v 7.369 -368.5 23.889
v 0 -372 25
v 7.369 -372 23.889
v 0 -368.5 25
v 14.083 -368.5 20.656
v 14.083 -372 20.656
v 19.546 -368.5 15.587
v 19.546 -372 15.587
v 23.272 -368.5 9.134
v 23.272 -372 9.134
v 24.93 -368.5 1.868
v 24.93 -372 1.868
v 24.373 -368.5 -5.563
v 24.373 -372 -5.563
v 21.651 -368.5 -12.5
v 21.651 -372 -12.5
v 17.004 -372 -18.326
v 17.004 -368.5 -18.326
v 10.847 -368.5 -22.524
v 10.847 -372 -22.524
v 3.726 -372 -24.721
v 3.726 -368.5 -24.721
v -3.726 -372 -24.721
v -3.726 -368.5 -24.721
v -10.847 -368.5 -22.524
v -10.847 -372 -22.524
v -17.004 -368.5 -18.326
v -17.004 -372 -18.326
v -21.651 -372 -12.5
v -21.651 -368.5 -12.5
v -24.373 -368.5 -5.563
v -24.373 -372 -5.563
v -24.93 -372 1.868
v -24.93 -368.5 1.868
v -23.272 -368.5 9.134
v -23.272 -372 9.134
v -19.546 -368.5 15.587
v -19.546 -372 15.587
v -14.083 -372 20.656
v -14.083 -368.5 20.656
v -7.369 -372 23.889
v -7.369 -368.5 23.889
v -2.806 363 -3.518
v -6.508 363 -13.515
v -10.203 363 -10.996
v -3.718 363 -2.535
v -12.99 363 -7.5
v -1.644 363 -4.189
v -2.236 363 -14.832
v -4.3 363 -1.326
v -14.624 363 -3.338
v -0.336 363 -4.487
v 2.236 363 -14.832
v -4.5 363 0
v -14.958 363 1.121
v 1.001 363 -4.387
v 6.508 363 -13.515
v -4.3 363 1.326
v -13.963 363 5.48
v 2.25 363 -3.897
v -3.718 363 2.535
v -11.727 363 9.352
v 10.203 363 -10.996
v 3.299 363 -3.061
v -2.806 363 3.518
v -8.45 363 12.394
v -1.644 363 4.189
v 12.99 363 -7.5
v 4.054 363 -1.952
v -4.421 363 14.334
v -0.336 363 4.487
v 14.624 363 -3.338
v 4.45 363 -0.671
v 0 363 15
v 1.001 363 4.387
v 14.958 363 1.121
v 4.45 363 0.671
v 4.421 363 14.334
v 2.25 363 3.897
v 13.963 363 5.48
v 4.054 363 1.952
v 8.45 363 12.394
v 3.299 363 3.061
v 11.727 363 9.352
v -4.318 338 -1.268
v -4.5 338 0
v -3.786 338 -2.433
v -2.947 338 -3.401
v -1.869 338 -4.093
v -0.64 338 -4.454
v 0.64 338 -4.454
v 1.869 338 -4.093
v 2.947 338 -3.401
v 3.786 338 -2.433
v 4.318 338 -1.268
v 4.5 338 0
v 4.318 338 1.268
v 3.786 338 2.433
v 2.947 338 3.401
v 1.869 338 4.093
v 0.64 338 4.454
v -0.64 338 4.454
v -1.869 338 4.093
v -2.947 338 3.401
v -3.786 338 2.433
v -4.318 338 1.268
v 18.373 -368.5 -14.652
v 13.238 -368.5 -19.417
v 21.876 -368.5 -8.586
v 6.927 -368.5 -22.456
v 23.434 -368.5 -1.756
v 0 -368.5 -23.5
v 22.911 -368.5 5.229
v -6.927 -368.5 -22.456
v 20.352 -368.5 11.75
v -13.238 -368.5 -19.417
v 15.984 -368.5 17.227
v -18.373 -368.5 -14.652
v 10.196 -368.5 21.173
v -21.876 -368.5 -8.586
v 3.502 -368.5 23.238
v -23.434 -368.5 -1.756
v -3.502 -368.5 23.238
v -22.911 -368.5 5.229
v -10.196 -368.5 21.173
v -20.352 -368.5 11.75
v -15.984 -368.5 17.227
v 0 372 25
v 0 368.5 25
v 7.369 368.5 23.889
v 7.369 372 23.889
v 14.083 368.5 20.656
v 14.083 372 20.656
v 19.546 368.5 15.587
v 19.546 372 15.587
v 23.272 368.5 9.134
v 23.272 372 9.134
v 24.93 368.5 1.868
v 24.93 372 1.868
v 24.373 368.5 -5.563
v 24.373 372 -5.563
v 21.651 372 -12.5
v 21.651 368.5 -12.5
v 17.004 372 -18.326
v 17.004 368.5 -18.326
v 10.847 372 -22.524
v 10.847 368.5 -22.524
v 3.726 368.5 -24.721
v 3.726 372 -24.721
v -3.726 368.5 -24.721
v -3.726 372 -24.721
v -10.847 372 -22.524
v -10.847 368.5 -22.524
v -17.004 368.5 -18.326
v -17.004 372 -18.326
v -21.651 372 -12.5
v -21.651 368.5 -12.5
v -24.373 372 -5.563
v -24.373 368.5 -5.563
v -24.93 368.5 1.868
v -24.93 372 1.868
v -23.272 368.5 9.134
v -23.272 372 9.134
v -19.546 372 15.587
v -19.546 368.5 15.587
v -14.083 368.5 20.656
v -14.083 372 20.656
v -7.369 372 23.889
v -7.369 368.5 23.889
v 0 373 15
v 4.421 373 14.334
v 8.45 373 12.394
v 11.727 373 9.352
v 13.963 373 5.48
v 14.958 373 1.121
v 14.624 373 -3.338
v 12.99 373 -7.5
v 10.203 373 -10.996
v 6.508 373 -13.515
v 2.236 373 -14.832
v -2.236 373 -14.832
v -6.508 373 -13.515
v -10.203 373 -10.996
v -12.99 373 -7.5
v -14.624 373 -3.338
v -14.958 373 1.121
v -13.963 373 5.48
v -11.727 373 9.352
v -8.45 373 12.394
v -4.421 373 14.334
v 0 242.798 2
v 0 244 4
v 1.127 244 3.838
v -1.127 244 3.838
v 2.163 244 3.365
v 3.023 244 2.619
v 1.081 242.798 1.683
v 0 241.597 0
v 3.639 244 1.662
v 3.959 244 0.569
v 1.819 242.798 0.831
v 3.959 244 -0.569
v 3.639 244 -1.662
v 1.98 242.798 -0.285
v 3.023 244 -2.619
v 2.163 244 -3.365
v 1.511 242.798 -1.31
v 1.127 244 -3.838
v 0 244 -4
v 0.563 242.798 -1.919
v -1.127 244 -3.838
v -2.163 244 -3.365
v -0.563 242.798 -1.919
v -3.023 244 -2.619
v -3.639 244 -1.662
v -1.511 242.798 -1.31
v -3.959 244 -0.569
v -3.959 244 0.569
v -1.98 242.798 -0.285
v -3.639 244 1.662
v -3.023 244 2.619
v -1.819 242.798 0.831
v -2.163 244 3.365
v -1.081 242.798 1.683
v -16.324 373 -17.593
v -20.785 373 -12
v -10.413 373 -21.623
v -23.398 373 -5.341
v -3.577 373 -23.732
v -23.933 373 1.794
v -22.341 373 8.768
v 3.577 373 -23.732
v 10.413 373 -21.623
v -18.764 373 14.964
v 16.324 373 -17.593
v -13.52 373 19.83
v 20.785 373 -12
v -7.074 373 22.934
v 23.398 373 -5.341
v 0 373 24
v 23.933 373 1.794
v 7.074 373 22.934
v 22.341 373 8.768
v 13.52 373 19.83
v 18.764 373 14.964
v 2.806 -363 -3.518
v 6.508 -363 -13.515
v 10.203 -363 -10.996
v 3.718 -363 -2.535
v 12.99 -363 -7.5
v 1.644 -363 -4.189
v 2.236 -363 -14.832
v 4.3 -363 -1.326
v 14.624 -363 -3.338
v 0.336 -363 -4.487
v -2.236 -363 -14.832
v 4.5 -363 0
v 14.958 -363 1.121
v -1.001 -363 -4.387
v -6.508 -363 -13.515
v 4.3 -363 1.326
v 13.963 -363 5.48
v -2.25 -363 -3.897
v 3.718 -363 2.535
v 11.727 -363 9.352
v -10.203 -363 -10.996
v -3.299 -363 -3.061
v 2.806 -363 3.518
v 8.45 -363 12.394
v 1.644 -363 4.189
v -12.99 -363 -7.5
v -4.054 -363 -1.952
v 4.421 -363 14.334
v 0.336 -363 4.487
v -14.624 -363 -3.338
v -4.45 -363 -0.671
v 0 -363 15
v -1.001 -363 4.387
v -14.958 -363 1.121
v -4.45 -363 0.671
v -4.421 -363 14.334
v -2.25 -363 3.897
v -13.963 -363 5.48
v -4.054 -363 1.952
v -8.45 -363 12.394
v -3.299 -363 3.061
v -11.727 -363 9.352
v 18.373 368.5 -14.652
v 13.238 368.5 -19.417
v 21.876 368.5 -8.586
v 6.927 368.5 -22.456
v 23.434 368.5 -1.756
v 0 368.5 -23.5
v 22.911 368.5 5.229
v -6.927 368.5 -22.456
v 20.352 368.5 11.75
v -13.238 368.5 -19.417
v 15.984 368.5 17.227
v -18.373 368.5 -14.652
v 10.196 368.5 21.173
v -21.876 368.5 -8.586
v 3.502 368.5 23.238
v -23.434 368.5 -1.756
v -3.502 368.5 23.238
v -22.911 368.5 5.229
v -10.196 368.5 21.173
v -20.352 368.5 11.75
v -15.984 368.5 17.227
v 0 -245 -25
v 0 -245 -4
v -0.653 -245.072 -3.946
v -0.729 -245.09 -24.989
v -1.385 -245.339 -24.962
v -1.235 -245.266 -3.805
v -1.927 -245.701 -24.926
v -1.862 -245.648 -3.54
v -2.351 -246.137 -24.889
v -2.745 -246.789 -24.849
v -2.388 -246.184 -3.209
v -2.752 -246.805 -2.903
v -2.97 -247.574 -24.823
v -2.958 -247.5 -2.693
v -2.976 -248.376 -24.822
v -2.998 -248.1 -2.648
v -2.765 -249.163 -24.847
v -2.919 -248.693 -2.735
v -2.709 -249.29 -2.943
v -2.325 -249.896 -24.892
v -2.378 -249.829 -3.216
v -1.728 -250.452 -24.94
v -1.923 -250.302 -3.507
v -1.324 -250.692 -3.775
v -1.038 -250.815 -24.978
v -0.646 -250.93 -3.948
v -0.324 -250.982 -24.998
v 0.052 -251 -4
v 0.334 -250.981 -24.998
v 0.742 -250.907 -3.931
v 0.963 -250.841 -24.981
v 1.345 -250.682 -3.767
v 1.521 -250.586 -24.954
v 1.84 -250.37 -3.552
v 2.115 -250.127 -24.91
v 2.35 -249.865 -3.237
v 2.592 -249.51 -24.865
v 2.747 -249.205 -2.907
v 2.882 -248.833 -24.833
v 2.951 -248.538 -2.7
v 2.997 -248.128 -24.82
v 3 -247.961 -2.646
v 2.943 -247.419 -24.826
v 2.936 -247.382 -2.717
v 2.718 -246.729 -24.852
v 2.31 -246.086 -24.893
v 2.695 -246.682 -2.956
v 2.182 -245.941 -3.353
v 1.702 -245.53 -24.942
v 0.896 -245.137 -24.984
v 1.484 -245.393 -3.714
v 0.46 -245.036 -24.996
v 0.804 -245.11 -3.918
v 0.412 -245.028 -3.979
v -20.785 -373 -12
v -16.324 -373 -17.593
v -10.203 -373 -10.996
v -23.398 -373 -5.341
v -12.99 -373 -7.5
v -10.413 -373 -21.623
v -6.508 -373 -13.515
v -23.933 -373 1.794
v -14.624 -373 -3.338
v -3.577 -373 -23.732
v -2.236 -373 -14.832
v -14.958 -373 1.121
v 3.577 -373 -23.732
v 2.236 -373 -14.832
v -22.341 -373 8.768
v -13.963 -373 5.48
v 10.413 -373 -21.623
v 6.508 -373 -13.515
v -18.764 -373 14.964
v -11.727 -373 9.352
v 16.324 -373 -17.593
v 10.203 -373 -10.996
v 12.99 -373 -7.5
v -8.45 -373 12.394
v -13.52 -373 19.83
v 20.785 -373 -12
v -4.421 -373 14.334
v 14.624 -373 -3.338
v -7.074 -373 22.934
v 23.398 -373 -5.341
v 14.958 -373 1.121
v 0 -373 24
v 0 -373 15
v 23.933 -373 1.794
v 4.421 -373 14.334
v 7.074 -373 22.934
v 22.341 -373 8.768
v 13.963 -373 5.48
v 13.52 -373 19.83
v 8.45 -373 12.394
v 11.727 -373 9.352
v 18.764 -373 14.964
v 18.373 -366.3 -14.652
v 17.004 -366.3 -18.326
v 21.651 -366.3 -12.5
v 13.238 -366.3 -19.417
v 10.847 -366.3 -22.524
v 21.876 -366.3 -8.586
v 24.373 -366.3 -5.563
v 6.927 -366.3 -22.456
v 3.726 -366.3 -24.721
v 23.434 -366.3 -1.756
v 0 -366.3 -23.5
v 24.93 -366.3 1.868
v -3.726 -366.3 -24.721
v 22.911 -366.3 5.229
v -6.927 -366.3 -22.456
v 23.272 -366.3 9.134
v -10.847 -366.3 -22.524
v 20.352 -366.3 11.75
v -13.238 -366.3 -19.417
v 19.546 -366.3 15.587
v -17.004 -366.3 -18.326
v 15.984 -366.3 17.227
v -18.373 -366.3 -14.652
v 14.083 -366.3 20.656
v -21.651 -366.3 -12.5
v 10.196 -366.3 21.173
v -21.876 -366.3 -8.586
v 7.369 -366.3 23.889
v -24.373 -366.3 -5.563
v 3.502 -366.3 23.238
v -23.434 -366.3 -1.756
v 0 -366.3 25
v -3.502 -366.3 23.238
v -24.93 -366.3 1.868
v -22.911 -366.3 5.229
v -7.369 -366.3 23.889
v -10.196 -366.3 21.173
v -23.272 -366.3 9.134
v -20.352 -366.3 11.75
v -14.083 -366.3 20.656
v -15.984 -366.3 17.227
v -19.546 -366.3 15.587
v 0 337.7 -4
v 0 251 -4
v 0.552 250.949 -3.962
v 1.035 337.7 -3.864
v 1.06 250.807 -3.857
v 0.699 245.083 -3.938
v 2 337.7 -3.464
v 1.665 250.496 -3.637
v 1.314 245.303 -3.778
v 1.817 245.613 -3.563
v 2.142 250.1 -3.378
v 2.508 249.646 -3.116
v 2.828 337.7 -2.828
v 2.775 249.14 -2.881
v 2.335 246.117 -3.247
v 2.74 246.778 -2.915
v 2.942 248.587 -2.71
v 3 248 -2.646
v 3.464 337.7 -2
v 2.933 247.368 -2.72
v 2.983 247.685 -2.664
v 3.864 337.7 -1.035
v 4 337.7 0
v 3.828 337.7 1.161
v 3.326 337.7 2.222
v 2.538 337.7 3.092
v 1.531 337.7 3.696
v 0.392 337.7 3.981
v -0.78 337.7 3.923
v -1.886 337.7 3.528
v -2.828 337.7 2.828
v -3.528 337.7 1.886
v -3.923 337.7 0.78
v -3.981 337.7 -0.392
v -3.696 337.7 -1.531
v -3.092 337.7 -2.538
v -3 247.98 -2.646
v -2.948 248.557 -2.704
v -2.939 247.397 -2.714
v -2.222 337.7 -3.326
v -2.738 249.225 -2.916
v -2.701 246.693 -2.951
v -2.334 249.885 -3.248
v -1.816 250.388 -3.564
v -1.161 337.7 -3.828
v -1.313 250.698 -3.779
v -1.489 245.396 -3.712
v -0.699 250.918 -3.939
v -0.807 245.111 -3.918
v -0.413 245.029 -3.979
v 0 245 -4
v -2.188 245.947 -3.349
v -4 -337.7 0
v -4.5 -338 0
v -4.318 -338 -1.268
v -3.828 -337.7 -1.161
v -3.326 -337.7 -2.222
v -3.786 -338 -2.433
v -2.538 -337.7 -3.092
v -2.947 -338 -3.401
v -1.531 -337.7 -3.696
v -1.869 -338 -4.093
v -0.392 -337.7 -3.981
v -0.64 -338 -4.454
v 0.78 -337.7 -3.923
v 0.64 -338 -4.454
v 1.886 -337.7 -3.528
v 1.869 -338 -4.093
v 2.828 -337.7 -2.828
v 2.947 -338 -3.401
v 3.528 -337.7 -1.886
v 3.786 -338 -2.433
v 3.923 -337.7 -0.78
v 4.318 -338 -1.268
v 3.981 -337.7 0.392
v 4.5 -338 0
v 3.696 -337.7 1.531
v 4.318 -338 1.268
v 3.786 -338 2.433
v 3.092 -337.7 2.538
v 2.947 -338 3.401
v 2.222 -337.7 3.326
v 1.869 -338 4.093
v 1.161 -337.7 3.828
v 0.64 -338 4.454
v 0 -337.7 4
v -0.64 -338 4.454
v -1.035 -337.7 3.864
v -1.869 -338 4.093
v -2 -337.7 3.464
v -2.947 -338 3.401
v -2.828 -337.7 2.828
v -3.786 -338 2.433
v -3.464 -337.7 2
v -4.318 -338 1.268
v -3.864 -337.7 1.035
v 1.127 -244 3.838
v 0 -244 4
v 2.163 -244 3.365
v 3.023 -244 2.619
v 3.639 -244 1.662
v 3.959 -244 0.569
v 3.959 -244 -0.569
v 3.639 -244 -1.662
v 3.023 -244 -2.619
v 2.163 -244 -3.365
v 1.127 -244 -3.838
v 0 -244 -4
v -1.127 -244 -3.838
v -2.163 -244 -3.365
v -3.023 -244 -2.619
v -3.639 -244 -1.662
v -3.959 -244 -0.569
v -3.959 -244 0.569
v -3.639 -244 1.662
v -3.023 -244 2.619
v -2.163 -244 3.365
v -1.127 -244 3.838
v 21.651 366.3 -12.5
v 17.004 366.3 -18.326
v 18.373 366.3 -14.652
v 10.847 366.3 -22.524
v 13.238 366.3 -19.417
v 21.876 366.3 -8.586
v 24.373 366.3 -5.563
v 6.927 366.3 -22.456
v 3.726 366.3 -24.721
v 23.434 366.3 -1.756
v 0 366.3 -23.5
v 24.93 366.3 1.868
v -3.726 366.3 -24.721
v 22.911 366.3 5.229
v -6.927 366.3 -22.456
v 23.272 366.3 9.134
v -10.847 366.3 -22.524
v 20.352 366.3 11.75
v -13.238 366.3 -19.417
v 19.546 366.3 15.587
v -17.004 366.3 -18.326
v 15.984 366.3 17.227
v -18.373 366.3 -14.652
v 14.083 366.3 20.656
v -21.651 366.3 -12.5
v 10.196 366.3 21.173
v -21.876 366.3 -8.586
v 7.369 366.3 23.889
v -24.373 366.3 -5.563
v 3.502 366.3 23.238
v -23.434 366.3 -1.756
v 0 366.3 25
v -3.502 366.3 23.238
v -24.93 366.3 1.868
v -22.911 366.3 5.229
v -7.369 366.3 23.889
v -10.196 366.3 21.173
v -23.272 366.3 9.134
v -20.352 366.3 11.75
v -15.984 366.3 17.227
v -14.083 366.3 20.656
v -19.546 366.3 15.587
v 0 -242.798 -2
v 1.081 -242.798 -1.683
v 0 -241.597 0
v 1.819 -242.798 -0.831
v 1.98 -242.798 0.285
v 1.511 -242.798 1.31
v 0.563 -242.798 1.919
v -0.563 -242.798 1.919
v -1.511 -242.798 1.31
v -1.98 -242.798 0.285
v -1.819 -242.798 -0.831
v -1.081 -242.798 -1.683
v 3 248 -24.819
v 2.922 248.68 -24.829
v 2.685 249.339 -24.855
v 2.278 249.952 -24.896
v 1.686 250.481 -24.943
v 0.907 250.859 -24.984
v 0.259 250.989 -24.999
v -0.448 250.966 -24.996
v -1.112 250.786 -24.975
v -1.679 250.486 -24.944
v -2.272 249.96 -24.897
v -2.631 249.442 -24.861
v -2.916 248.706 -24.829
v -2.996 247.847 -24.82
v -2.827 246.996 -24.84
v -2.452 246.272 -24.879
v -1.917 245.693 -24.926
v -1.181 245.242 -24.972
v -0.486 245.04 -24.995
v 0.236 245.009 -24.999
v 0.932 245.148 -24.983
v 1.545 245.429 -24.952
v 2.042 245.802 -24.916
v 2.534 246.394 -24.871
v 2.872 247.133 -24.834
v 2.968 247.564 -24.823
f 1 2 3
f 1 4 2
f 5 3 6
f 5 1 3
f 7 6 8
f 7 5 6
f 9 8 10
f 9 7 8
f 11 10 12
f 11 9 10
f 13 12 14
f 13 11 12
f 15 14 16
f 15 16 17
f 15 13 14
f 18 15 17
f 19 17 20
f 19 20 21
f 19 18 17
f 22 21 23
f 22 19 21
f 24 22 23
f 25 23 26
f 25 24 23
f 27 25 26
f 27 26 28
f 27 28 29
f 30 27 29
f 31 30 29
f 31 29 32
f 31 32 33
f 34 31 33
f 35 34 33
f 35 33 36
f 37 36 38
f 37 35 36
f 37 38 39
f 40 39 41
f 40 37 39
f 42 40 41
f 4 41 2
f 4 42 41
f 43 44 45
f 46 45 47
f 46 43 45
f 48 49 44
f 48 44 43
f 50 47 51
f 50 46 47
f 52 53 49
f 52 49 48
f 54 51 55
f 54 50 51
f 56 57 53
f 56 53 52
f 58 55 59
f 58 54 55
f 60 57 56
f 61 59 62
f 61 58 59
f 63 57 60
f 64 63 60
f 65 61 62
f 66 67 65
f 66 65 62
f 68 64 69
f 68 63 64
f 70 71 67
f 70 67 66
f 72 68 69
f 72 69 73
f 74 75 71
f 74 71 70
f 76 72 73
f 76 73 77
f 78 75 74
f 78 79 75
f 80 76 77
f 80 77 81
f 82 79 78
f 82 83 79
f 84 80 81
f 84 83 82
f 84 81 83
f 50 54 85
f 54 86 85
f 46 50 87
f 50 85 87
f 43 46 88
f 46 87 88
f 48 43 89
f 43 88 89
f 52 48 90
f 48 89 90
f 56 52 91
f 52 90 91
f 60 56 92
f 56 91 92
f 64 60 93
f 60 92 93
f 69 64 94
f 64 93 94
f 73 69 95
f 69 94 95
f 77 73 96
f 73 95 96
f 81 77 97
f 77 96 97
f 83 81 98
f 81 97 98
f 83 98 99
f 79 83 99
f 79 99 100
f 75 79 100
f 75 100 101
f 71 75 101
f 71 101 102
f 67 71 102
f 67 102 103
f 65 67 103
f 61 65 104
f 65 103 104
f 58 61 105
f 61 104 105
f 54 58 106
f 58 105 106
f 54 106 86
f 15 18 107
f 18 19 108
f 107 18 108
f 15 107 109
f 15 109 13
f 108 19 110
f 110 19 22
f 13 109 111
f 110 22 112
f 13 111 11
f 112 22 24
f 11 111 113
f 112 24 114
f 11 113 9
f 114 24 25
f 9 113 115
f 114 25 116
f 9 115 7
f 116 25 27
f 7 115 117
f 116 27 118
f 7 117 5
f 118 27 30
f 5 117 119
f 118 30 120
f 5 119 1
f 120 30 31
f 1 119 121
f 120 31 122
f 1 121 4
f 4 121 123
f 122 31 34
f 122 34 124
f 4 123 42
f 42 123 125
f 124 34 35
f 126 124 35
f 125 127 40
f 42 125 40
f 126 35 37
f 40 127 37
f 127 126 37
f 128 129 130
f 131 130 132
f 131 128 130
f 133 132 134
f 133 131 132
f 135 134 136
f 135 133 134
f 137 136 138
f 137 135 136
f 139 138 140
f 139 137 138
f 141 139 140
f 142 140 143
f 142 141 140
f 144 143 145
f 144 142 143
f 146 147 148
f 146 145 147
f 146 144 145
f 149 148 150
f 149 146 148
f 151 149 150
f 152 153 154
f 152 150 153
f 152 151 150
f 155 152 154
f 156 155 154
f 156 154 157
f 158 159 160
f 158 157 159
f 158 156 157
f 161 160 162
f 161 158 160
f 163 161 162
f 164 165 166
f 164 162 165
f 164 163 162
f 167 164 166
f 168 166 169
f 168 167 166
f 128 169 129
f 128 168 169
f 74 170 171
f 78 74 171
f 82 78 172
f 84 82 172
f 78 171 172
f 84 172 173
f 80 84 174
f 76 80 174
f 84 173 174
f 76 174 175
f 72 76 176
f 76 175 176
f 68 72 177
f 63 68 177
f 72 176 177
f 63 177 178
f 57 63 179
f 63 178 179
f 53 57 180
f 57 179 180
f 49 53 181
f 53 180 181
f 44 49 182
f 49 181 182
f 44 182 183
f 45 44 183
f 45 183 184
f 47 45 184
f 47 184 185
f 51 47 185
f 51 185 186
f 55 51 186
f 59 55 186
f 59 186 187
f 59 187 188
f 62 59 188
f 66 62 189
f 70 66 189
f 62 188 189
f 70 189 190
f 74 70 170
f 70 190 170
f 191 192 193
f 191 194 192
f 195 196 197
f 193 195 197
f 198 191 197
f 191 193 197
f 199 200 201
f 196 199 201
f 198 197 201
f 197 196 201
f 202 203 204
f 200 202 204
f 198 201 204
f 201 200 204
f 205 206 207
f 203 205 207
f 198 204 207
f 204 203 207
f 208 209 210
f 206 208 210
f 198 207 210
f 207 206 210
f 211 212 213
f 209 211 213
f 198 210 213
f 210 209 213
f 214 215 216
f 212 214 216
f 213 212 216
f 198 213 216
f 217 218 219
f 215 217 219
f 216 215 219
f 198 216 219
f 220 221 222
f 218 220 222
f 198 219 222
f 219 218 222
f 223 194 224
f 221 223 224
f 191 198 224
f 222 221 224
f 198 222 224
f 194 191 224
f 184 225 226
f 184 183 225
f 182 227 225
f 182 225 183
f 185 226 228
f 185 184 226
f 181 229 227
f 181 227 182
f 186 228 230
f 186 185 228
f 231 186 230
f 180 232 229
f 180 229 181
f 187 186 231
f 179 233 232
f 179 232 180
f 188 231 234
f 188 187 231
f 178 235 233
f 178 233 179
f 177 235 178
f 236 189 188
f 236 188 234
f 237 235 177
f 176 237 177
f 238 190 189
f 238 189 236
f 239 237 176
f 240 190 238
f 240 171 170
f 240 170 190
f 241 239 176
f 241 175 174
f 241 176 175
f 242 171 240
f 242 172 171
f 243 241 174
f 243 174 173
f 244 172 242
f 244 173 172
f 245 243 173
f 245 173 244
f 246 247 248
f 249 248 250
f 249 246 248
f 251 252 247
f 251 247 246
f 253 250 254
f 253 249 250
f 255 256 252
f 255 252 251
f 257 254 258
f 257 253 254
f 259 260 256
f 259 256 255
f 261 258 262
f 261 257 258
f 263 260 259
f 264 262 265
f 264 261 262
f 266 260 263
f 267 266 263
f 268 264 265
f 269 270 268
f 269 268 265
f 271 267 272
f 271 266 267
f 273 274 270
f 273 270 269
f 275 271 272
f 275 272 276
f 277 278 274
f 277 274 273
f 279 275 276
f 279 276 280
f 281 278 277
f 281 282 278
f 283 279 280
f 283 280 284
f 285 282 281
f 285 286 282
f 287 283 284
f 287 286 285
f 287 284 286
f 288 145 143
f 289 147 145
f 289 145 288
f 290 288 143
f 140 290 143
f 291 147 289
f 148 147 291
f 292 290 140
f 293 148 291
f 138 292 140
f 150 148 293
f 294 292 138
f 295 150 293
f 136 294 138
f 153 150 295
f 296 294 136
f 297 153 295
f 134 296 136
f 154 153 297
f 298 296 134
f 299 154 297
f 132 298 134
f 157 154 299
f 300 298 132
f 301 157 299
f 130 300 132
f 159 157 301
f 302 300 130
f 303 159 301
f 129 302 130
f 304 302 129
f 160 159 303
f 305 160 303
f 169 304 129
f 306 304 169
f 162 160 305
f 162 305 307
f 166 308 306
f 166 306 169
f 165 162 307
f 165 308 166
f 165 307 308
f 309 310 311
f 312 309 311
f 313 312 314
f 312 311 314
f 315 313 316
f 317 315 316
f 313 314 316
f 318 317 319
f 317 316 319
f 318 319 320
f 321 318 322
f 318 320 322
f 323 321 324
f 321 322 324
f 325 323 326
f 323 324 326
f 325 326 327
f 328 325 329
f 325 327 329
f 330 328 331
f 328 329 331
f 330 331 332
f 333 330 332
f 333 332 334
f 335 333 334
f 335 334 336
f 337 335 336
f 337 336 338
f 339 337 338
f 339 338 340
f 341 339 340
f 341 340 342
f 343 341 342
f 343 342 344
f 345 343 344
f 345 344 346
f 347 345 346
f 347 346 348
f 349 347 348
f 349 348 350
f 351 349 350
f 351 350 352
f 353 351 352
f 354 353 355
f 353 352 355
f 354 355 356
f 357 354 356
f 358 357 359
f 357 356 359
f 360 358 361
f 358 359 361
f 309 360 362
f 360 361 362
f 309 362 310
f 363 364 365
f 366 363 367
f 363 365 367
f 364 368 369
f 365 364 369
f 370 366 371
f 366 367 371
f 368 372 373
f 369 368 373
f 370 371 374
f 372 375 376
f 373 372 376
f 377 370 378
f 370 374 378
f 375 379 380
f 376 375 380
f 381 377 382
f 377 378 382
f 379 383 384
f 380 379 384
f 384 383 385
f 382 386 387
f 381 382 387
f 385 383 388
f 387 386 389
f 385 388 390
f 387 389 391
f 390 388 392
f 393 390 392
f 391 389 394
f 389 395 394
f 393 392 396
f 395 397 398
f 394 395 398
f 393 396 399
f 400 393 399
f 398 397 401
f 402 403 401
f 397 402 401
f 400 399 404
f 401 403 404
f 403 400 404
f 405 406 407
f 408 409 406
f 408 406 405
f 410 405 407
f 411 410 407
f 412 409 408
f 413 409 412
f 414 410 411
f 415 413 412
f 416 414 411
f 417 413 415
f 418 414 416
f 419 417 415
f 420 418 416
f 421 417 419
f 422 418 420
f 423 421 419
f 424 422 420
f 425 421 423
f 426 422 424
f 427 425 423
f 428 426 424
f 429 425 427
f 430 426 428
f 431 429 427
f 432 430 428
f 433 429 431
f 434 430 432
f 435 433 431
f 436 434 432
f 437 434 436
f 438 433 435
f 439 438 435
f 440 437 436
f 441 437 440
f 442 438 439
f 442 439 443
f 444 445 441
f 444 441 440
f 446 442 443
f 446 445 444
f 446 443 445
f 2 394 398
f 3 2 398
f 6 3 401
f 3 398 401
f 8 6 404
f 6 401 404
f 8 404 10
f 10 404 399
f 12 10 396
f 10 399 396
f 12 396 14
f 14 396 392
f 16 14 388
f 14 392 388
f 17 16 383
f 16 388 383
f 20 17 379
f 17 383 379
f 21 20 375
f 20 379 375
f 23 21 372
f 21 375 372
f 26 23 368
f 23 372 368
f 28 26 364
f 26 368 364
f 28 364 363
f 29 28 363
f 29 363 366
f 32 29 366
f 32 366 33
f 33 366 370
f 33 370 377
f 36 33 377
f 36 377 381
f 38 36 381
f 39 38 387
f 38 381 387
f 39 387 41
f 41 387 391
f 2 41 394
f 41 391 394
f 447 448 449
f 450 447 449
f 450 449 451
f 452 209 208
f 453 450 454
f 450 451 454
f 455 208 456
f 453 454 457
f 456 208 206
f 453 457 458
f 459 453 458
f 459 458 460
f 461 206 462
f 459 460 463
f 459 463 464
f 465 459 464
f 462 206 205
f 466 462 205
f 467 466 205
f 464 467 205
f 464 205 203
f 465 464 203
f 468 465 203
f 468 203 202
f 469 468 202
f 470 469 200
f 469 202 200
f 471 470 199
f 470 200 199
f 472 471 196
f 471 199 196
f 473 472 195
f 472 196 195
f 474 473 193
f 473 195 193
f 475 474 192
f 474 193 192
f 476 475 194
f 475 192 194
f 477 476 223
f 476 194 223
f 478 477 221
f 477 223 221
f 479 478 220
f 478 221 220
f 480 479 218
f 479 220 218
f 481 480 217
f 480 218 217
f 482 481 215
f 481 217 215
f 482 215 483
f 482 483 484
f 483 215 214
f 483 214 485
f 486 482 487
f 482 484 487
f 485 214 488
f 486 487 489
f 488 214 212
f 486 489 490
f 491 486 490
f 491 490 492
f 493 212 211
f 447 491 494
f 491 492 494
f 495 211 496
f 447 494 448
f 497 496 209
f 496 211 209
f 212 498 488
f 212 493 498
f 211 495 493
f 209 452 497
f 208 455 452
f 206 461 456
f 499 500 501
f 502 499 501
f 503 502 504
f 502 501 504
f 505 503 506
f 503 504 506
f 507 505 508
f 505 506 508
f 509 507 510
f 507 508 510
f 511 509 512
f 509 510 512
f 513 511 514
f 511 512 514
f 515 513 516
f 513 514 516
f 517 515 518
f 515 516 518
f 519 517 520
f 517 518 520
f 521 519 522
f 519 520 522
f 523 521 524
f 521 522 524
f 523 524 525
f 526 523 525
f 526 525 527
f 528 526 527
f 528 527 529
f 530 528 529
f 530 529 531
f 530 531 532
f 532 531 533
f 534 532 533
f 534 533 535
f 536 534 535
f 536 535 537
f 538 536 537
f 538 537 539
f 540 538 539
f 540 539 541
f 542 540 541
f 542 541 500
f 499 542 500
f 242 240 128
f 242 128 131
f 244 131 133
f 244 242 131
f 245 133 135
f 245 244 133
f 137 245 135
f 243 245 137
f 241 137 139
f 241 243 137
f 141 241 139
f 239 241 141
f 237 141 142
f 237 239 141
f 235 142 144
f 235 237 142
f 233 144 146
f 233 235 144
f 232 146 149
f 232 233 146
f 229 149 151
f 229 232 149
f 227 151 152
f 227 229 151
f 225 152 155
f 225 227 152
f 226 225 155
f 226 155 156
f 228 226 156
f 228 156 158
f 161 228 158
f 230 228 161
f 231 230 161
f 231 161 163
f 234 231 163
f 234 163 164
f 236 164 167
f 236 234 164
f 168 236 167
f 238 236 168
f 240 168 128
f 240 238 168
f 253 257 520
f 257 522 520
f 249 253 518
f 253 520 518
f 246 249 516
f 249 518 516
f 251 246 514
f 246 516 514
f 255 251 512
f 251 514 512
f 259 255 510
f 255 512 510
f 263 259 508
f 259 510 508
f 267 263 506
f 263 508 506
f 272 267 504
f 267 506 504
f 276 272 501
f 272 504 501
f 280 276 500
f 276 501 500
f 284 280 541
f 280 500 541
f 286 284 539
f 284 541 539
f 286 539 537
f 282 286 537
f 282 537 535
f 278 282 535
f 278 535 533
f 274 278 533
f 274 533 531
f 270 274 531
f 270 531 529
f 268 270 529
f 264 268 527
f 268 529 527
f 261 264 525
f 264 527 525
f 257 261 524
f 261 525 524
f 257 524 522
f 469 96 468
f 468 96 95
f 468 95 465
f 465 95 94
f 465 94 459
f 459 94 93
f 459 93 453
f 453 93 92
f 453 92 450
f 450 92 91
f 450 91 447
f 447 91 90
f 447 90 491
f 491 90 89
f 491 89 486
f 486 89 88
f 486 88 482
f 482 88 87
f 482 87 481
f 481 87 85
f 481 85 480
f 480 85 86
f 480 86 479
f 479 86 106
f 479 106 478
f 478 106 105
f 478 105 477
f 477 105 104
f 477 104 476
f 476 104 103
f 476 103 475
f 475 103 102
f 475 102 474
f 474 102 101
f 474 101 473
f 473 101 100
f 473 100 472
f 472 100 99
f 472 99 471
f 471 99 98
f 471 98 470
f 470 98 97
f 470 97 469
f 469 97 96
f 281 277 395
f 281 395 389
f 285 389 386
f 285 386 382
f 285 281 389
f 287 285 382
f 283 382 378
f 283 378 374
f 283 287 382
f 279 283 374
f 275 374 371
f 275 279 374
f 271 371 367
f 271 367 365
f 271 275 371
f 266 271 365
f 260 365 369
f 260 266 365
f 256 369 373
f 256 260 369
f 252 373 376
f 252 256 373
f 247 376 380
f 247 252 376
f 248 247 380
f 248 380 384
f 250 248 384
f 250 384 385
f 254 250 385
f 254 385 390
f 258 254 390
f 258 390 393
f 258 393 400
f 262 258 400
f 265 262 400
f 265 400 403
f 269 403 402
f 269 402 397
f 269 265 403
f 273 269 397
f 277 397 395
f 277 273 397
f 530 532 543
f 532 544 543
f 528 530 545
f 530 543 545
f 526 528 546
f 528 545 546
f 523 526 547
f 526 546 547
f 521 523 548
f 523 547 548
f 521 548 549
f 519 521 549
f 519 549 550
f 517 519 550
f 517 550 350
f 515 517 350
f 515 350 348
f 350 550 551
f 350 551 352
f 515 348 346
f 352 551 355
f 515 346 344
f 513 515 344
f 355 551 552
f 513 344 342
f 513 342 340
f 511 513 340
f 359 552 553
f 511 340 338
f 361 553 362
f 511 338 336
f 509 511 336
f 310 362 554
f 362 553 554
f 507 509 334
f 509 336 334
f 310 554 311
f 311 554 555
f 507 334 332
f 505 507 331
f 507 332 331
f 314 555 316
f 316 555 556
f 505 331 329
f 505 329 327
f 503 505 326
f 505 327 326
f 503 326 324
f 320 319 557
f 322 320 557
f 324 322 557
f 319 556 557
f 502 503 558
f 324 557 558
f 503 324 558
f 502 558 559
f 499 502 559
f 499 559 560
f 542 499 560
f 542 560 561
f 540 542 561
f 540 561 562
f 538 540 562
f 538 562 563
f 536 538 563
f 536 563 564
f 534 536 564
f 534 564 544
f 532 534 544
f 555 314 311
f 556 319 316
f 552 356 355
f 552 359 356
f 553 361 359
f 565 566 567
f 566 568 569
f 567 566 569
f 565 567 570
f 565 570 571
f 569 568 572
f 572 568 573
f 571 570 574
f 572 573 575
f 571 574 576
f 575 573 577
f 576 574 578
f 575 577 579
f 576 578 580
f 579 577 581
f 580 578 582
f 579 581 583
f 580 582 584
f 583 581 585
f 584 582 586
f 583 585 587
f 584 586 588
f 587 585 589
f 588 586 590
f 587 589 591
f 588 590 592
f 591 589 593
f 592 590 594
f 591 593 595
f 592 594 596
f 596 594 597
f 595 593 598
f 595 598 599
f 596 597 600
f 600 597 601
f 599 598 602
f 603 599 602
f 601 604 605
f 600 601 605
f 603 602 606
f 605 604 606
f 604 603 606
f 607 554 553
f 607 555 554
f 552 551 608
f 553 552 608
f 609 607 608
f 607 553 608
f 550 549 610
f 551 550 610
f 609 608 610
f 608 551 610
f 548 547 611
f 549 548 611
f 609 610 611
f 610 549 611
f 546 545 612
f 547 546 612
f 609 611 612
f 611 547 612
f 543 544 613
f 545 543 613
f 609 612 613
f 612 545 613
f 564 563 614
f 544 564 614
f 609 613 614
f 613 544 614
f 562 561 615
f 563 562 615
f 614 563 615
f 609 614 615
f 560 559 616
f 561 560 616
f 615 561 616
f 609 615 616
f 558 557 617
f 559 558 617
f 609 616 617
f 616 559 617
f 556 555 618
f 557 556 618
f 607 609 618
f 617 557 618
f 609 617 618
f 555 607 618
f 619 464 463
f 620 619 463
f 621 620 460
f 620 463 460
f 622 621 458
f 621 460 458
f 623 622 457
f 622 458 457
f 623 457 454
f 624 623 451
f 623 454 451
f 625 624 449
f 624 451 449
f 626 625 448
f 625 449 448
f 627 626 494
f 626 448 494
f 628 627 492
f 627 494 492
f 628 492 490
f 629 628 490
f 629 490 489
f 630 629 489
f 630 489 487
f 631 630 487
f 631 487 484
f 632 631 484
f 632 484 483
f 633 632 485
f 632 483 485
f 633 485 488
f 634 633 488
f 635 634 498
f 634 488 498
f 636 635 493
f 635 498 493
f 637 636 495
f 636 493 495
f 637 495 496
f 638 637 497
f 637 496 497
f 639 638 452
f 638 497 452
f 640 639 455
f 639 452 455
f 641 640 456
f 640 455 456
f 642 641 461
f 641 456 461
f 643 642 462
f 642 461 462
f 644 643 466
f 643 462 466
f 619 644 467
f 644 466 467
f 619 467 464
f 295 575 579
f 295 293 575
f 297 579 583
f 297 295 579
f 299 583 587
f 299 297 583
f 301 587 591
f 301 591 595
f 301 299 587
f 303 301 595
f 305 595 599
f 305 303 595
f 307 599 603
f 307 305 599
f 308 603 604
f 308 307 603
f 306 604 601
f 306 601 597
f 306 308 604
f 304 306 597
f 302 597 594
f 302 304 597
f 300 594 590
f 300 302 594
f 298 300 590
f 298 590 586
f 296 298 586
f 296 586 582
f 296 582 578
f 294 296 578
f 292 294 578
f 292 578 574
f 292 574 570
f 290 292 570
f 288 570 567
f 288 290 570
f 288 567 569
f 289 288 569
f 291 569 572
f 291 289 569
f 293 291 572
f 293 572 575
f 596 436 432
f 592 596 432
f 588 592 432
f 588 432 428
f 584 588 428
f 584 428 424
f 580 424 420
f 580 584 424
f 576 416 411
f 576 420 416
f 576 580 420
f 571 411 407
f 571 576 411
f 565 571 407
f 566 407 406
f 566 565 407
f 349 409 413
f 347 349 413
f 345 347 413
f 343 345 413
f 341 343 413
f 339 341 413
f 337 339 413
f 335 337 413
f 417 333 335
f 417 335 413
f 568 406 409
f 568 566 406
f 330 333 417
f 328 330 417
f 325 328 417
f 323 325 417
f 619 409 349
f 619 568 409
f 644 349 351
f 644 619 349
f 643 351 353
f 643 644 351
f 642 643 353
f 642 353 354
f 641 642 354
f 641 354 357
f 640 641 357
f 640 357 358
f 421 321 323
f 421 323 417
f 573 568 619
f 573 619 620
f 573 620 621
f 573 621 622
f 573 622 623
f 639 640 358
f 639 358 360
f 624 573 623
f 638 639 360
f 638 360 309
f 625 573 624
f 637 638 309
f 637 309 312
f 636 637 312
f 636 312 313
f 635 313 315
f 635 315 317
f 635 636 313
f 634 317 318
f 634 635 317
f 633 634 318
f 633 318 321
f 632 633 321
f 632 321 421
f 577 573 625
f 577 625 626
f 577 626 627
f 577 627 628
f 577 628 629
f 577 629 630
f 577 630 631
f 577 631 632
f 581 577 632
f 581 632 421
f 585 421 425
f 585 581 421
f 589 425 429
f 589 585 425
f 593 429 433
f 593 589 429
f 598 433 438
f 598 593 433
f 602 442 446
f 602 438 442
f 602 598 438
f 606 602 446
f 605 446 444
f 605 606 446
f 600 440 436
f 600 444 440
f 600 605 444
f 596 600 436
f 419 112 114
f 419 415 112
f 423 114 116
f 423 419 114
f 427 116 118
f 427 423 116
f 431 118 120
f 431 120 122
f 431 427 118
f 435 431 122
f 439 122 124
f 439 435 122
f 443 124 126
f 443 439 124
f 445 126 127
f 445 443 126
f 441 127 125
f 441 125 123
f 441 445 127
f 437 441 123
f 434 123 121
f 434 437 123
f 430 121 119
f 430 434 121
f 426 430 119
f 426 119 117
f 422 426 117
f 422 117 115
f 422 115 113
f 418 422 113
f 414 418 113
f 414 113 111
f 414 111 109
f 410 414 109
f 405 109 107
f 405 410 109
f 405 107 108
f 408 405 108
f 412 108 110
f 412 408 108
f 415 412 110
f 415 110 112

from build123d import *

# Parameters (mm, degrees)
SKETCH_1_R                = 25
EXTRUDE_1_DEPTH           = 373
SKETCH_2_R                = 15
CUT_EXTRUDE_1_DEPTH       = 10
HOLE_WIZARD_8_0_8_1_D     = 8
HOLE_WIZARD_8_0_8_1_DEPTH = 119
HOLE_WIZARD_8_0_8_1_TIP   = 2.403442476
SKETCH_5_R                = 3
CUT_EXTRUDE_2_DEPTH       = 100
M10X1_0_1_D               = 9
M10X1_0_1_DEPTH           = 25
M10X1_0_1_TIP             = 2.703872786
CUT_EXTRUDE_START         = -10
SKETCH_8_R                = 15
CUT_EXTRUDE_3_DEPTH       = 10
HOLE_WIZARD_8_0_8_2_D     = 8
HOLE_WIZARD_8_0_8_2_DEPTH = 119
HOLE_WIZARD_8_0_8_2_TIP   = 2.403442476
M10X1_0_2_D               = 9
M10X1_0_2_DEPTH           = 25
M10X1_0_2_TIP             = 2.703872786
SKETCH_12_R               = 3
CUT_EXTRUDE_4_DEPTH       = 51
CHAMFER_1_SIZE            = 1
SKETCH_14_W               = 1.5
SKETCH_14_H               = 2.2


with BuildPart() as part:
    # 草图1 → 凸台-拉伸1 (new, symmetric)
    with BuildSketch(Plane(origin=(0, 0, 0), x_dir=(1, 0, 0), z_dir=(0, 1, 0))):
        with Locations(Location((0, 0, 0), (0, 0, 270))):
            Circle(SKETCH_1_R)
    extrude(amount=EXTRUDE_1_DEPTH, both=True)

    # 草图2 → 切除-拉伸1 (cut)
    with BuildSketch(Plane(origin=(0, 373, 0), x_dir=(1, 0, 0), z_dir=(0, 1, 0))):
        with Locations(Location((0, 0, 0), (0, 0, 270))):
            Circle(SKETCH_2_R)
    extrude(amount=-CUT_EXTRUDE_1_DEPTH, mode=Mode.SUBTRACT)

    # Ø8.0 (8) 直径孔1
    with Locations(Plane.ZX.offset(363)):
        with Locations((0, 0)):
            Hole(HOLE_WIZARD_8_0_8_1_D / 2, depth=HOLE_WIZARD_8_0_8_1_DEPTH)
            with Locations((0, 0, -(HOLE_WIZARD_8_0_8_1_DEPTH + HOLE_WIZARD_8_0_8_1_TIP / 2))):  # 118° drill point
                Cone(0, HOLE_WIZARD_8_0_8_1_D / 2, HOLE_WIZARD_8_0_8_1_TIP, mode=Mode.SUBTRACT)

    # 草图5 → 切除-拉伸2 (cut)
    with BuildSketch(Plane.XY):
        with Locations((0, 248)):
            Circle(SKETCH_5_R)
    extrude(amount=-CUT_EXTRUDE_2_DEPTH, mode=Mode.SUBTRACT)

    # M10x1.0 螺纹孔1
    with Locations(Plane(origin=(0, 363, 0), x_dir=(1, 0, 0), z_dir=(0, 1, 0))):
        with Locations((0, 0)):
            Hole(M10X1_0_1_D / 2, depth=M10X1_0_1_DEPTH)
            with Locations((0, 0, -(M10X1_0_1_DEPTH + M10X1_0_1_TIP / 2))):  # 118° drill point
                Cone(0, M10X1_0_1_D / 2, M10X1_0_1_TIP, mode=Mode.SUBTRACT)

    # 草图8 → 切除-拉伸3 (cut)
    with BuildSketch(Plane.XZ.offset(373).offset(CUT_EXTRUDE_START)):
        with Locations(Location((0, 0, 0), (0, 0, 90))):
            Circle(SKETCH_8_R)
    extrude(amount=CUT_EXTRUDE_3_DEPTH, mode=Mode.SUBTRACT)

    # Ø8.0 (8) 直径孔2
    with Locations(Plane(origin=(0, -363, 0), x_dir=(0, 0, -1), z_dir=(0, -1, 0))):
        with Locations((0, 0)):
            Hole(HOLE_WIZARD_8_0_8_2_D / 2, depth=HOLE_WIZARD_8_0_8_2_DEPTH)
            with Locations((0, 0, -(HOLE_WIZARD_8_0_8_2_DEPTH + HOLE_WIZARD_8_0_8_2_TIP / 2))):  # 118° drill point
                Cone(0, HOLE_WIZARD_8_0_8_2_D / 2, HOLE_WIZARD_8_0_8_2_TIP, mode=Mode.SUBTRACT)

    # M10x1.0 螺纹孔2
    with Locations(Plane(origin=(0, -363, 0), x_dir=(-1, 0, 0), z_dir=(0, -1, 0))):
        with Locations((0, 0)):
            Hole(M10X1_0_2_D / 2, depth=M10X1_0_2_DEPTH)
            with Locations((0, 0, -(M10X1_0_2_DEPTH + M10X1_0_2_TIP / 2))):  # 118° drill point
                Cone(0, M10X1_0_2_D / 2, M10X1_0_2_TIP, mode=Mode.SUBTRACT)

    # 草图12 → 切除-拉伸4 (cut)
    with BuildSketch(Plane.XY):
        with Locations(Location((0, -248, 0), (0, 0, 90))):
            Circle(SKETCH_12_R)
    extrude(amount=-CUT_EXTRUDE_4_DEPTH, mode=Mode.SUBTRACT)

    # 倒角1
    chamfer_1_edges = [part.edges().sort_by_distance(p)[0] for p in [
        (0, -373, -25),
        (0, 373, -25),
    ]]
    chamfer(chamfer_1_edges, length=CHAMFER_1_SIZE)

    # 草图14 → 切除-旋转1 (revolve, cut)
    with BuildSketch(Plane(origin=(0, 0, 0), x_dir=(0, 0, -1), z_dir=(1, 0, 0))):
        with Locations((24.25, 367.4)):
            Rectangle(SKETCH_14_W, SKETCH_14_H)
        with Locations((24.25, -367.4)):
            Rectangle(SKETCH_14_W, SKETCH_14_H)
    revolve(axis=Axis((0, 0, 0), (0, 1, 0)), mode=Mode.SUBTRACT)


solid = part.part
